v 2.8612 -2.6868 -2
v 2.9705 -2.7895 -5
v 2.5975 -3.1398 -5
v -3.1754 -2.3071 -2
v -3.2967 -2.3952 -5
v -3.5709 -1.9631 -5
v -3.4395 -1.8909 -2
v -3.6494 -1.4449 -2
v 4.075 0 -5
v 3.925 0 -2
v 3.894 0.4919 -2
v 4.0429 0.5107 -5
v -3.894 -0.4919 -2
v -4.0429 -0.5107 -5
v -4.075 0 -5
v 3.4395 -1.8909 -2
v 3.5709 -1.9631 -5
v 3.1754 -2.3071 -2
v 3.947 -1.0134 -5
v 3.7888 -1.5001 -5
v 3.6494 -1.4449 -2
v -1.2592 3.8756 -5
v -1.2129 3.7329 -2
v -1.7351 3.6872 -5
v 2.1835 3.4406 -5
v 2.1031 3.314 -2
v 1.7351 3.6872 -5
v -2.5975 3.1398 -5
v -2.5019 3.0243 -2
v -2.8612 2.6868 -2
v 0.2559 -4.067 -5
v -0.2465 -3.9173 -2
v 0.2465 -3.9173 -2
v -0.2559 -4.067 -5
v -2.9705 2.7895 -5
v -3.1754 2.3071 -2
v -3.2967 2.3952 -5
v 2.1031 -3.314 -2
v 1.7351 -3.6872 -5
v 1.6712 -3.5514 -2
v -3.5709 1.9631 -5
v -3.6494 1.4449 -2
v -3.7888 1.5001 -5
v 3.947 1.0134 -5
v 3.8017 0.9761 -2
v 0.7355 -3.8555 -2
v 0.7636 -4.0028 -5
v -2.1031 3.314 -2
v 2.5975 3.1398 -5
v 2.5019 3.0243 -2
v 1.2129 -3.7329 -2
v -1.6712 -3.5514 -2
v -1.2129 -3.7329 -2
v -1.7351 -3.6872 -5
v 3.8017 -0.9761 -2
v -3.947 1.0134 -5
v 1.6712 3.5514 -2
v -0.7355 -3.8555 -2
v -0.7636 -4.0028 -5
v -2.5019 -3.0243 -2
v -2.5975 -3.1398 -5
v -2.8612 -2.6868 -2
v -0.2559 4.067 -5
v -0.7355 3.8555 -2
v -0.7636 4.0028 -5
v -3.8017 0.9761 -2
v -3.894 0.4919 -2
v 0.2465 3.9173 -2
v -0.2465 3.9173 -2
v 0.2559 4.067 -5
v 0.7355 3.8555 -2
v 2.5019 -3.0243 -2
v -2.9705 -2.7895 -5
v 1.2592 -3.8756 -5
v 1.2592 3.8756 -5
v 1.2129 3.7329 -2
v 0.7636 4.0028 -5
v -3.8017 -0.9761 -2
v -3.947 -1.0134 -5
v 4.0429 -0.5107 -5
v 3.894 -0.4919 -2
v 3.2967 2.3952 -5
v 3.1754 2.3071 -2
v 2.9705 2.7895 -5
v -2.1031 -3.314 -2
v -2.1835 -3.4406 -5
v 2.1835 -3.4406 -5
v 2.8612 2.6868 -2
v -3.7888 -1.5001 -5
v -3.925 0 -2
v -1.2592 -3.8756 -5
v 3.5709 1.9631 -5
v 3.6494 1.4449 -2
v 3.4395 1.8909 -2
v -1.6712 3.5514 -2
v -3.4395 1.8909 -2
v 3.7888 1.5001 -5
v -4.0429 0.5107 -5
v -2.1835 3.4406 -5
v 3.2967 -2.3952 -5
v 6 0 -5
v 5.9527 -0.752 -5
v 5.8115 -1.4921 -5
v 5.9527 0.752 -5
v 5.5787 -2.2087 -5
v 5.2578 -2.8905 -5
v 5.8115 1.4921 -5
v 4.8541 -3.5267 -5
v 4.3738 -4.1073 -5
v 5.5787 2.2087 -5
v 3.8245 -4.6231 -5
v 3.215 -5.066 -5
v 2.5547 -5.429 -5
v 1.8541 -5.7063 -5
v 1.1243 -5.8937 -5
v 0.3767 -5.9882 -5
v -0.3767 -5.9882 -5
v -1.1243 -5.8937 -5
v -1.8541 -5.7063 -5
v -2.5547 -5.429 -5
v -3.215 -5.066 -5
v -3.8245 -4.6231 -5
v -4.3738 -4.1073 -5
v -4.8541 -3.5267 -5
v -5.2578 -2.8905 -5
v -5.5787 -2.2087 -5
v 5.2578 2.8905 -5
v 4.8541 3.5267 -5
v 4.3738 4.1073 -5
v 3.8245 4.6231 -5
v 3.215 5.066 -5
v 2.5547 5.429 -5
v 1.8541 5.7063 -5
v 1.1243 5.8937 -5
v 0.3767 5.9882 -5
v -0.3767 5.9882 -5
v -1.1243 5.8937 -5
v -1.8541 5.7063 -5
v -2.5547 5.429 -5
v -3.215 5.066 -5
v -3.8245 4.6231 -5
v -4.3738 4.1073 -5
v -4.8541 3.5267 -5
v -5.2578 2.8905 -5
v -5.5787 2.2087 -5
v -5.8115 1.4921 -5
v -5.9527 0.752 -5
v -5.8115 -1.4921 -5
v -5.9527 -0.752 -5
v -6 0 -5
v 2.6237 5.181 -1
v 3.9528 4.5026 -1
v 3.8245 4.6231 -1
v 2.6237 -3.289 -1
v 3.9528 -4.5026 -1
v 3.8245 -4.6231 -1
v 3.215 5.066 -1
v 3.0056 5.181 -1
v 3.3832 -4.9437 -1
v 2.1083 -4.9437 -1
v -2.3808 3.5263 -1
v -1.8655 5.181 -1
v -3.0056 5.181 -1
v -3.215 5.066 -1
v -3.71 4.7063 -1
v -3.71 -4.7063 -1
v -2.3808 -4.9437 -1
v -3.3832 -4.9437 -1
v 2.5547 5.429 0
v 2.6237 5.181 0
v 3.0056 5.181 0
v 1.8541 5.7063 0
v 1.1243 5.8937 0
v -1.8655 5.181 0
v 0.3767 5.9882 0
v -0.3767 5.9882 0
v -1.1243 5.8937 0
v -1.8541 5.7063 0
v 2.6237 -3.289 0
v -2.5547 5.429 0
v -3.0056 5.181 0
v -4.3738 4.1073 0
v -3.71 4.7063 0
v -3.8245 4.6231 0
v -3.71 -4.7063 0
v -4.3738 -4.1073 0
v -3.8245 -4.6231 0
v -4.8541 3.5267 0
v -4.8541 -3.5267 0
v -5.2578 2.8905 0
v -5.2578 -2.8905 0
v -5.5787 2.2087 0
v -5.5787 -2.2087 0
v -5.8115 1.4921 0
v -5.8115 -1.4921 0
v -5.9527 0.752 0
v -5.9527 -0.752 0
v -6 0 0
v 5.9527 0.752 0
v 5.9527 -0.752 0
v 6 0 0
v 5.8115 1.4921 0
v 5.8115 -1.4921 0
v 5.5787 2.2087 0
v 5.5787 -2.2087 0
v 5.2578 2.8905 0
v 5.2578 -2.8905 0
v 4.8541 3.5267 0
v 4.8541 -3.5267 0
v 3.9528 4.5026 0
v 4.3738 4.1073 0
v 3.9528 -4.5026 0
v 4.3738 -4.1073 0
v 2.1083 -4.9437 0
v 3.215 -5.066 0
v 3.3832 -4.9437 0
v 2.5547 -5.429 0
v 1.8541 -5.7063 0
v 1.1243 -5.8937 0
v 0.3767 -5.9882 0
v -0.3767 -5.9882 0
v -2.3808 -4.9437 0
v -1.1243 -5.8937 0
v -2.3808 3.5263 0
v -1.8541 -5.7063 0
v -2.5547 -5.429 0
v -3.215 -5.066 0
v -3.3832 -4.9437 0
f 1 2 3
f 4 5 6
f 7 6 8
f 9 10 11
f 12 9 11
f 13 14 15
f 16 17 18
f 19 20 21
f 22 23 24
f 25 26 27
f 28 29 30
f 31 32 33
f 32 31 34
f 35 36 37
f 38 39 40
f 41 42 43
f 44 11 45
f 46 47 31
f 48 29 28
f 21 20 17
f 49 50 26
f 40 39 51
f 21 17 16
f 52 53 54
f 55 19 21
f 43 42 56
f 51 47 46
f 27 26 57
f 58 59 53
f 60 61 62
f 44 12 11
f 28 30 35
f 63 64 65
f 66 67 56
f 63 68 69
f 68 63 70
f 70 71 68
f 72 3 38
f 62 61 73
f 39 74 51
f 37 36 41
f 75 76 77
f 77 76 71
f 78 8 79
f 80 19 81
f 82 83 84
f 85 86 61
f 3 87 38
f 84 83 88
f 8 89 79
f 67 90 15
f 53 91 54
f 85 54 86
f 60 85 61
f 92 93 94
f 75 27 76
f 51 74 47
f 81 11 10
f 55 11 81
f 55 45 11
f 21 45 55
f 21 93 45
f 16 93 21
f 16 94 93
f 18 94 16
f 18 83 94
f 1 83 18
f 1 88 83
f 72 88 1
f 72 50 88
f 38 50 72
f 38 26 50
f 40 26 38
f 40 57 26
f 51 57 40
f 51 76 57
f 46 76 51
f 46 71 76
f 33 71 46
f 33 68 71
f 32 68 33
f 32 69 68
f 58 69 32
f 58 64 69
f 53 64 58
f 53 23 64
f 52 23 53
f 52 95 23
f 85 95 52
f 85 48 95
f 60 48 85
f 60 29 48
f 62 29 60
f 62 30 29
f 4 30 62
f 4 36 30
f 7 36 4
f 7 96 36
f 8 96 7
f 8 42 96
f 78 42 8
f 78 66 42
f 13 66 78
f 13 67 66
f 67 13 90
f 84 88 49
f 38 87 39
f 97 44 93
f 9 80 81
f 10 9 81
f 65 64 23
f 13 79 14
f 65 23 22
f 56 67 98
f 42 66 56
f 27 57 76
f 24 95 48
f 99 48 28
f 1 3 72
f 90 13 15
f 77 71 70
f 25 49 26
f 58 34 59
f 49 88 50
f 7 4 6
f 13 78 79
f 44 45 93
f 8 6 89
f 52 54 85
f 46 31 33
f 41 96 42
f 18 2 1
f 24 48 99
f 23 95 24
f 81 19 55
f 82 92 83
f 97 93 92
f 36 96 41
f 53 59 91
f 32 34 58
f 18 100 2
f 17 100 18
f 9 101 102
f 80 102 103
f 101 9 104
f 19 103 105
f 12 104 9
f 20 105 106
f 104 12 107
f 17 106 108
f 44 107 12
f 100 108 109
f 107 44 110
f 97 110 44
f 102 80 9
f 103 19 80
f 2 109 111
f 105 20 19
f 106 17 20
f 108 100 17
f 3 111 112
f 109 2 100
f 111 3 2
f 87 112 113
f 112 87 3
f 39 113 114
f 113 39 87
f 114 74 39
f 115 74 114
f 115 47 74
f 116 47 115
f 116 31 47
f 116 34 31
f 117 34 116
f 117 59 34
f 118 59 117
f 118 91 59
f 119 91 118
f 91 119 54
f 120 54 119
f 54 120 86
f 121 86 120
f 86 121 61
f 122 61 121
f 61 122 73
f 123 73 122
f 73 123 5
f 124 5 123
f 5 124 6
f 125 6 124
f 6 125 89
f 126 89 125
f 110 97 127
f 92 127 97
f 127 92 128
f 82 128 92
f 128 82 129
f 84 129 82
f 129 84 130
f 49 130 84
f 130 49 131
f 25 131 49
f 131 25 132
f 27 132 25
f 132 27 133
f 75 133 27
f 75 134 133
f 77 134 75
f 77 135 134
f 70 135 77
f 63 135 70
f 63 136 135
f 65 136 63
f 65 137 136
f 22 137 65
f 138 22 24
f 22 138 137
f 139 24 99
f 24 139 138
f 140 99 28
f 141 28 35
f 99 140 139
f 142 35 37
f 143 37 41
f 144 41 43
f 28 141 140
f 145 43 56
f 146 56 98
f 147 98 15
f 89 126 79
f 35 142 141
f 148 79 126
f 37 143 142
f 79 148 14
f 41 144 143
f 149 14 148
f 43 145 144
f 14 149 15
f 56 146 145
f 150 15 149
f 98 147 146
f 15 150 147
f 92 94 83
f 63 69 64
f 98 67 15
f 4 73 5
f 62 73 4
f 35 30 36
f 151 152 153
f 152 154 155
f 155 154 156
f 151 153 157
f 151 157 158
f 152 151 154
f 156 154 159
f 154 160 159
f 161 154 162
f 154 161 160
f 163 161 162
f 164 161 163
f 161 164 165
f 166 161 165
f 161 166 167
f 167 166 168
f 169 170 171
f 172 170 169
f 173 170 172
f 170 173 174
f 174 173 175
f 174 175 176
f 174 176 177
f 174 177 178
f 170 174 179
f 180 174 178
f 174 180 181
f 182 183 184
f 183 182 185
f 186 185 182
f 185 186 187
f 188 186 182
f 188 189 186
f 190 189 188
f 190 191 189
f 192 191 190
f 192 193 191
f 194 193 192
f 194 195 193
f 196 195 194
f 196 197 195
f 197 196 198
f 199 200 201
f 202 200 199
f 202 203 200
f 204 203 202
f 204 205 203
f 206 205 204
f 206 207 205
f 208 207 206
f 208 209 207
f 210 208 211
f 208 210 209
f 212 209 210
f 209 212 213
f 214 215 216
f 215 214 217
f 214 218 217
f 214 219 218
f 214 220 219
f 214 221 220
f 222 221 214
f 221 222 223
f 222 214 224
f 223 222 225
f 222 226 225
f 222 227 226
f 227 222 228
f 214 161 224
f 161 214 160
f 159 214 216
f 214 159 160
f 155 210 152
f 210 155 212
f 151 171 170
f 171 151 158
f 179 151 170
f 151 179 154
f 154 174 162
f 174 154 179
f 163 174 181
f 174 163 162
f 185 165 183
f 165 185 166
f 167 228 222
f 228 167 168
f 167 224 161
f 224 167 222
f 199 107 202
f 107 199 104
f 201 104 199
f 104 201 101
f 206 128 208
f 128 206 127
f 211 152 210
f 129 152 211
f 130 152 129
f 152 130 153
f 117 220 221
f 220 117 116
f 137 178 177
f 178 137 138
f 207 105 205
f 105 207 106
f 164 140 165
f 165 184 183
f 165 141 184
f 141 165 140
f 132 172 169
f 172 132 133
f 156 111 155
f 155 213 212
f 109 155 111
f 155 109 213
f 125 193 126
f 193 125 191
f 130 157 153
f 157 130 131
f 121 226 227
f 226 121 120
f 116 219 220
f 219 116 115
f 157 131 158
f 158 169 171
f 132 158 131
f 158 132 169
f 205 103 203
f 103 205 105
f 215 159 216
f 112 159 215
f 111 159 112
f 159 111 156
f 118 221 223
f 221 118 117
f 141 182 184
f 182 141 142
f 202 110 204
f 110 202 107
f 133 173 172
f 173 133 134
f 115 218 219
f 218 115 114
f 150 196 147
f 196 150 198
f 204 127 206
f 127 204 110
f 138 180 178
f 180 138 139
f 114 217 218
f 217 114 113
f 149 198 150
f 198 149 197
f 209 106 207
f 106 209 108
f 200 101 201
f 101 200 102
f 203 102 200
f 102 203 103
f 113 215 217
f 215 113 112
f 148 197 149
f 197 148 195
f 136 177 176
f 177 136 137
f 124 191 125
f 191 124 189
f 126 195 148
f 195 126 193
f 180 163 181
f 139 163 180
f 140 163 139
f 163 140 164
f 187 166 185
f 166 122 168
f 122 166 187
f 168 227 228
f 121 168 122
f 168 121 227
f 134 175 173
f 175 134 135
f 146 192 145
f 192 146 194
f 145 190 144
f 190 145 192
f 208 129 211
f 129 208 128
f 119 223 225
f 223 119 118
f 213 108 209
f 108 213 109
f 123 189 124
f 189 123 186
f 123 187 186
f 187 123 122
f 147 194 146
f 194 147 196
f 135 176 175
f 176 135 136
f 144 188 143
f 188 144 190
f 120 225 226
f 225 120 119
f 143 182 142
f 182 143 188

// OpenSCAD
$fn = 50;

difference() {
	union() {
		translate(v = [0, 0, -5.0]) {
			cylinder(h = 5, r = 6.0);
		}
	}
	union() {
		#translate(v = [0, 0, -5.0]) {
			cylinder(h = 3, r1 = 4.075, r2 = 3.925);
		}
		translate(v = [0, 0, -1]) {
			linear_extrude(height = 1) {
				text(font = "Impact", halign = "center", size = 10, text = "N", valign = "center");
			}
		}
	}
}
